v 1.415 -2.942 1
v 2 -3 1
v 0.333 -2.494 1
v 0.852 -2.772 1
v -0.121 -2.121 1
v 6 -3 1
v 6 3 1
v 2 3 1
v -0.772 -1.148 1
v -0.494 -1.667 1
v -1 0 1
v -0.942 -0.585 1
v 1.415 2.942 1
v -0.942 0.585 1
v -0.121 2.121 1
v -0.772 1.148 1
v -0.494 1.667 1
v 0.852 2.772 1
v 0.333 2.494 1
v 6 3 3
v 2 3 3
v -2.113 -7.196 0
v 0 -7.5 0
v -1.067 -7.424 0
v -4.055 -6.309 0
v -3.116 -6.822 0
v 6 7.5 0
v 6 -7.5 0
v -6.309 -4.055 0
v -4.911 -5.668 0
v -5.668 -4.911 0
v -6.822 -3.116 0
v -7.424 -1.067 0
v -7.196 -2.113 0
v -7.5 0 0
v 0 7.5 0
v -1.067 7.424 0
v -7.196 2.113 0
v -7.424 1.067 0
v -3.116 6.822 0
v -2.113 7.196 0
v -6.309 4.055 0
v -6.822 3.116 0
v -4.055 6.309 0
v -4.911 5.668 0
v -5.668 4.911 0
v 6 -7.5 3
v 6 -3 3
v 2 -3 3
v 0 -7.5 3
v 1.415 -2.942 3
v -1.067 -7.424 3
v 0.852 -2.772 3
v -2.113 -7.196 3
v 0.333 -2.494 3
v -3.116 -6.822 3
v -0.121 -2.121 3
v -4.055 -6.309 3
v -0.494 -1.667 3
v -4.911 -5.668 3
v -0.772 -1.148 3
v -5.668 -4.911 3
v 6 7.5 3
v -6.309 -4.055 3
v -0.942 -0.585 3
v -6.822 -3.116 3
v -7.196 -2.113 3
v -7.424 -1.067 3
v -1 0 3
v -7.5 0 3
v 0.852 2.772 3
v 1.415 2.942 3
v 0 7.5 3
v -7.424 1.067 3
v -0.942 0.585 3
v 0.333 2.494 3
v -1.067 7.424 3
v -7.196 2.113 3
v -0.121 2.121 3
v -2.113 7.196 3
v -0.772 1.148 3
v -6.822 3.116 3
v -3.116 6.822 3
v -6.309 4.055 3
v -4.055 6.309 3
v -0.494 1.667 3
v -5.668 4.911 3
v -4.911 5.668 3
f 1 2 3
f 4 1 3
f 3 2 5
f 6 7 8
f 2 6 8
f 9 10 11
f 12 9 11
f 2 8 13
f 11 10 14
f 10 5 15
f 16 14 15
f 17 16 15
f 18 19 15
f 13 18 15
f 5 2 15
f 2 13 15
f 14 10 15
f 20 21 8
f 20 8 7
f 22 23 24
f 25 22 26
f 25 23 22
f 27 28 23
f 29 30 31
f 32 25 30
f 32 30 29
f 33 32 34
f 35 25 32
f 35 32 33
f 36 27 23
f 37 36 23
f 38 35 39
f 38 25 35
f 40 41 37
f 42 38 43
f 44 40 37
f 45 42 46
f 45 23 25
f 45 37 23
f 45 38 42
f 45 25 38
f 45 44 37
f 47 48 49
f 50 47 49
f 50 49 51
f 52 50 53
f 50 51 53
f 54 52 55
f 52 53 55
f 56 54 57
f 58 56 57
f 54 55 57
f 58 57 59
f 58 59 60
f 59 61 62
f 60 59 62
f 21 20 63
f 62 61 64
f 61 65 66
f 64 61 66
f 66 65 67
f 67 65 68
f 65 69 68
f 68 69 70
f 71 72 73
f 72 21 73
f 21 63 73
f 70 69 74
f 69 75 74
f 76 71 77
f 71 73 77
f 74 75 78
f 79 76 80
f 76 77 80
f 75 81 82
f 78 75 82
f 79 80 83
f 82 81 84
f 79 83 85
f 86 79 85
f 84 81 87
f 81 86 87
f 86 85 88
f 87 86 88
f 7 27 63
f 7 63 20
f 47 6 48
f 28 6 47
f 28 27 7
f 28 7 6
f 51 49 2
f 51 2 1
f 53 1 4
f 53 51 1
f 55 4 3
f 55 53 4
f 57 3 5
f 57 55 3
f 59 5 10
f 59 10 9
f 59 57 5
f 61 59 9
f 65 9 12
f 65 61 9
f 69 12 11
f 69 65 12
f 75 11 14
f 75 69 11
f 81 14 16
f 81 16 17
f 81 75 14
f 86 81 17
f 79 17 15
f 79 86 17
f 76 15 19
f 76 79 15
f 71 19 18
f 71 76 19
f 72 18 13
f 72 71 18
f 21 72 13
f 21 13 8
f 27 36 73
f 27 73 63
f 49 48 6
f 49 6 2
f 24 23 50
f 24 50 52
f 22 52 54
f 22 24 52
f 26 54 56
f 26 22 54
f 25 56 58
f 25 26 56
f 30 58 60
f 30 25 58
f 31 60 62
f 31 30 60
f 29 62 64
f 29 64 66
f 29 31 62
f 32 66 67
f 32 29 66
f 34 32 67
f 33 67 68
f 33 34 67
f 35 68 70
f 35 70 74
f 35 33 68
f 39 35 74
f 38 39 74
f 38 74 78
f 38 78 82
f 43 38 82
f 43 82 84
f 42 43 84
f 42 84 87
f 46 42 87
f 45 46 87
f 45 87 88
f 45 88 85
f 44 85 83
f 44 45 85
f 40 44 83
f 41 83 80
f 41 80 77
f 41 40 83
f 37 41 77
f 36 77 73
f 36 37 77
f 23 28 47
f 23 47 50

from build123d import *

# Parameters (mm, degrees)
EXTRUDE_1_DEPTH     = 3
CUT_EXTRUDE_1_DEPTH = 2


with BuildPart() as part:
    # Эскиз1 → Бобышка-Вытянуть1 (new body)
    with BuildSketch(Plane.XY):
        with BuildLine():
            Line((0, 7.5), (6, 7.5))
            Line((6, 7.5), (6, -7.5))
            Line((6, -7.5), (0, -7.5))
            ThreePointArc((0, -7.5), (-7.5, 0), (0, 7.5))
        make_face()
    extrude(amount=EXTRUDE_1_DEPTH)

    # Эскиз2 → Вырез-Вытянуть1 (cut)
    with BuildSketch(Plane.XY.offset(3)):
        with BuildLine():
            Line((6, -3), (2, -3))
            ThreePointArc((2, -3), (-1, 0), (2, 3))
            Line((2, 3), (6, 3))
            ThreePointArc((6, 3), (9, 0), (6, -3))
        make_face()
    extrude(amount=-CUT_EXTRUDE_1_DEPTH, mode=Mode.SUBTRACT)


solid = part.part
